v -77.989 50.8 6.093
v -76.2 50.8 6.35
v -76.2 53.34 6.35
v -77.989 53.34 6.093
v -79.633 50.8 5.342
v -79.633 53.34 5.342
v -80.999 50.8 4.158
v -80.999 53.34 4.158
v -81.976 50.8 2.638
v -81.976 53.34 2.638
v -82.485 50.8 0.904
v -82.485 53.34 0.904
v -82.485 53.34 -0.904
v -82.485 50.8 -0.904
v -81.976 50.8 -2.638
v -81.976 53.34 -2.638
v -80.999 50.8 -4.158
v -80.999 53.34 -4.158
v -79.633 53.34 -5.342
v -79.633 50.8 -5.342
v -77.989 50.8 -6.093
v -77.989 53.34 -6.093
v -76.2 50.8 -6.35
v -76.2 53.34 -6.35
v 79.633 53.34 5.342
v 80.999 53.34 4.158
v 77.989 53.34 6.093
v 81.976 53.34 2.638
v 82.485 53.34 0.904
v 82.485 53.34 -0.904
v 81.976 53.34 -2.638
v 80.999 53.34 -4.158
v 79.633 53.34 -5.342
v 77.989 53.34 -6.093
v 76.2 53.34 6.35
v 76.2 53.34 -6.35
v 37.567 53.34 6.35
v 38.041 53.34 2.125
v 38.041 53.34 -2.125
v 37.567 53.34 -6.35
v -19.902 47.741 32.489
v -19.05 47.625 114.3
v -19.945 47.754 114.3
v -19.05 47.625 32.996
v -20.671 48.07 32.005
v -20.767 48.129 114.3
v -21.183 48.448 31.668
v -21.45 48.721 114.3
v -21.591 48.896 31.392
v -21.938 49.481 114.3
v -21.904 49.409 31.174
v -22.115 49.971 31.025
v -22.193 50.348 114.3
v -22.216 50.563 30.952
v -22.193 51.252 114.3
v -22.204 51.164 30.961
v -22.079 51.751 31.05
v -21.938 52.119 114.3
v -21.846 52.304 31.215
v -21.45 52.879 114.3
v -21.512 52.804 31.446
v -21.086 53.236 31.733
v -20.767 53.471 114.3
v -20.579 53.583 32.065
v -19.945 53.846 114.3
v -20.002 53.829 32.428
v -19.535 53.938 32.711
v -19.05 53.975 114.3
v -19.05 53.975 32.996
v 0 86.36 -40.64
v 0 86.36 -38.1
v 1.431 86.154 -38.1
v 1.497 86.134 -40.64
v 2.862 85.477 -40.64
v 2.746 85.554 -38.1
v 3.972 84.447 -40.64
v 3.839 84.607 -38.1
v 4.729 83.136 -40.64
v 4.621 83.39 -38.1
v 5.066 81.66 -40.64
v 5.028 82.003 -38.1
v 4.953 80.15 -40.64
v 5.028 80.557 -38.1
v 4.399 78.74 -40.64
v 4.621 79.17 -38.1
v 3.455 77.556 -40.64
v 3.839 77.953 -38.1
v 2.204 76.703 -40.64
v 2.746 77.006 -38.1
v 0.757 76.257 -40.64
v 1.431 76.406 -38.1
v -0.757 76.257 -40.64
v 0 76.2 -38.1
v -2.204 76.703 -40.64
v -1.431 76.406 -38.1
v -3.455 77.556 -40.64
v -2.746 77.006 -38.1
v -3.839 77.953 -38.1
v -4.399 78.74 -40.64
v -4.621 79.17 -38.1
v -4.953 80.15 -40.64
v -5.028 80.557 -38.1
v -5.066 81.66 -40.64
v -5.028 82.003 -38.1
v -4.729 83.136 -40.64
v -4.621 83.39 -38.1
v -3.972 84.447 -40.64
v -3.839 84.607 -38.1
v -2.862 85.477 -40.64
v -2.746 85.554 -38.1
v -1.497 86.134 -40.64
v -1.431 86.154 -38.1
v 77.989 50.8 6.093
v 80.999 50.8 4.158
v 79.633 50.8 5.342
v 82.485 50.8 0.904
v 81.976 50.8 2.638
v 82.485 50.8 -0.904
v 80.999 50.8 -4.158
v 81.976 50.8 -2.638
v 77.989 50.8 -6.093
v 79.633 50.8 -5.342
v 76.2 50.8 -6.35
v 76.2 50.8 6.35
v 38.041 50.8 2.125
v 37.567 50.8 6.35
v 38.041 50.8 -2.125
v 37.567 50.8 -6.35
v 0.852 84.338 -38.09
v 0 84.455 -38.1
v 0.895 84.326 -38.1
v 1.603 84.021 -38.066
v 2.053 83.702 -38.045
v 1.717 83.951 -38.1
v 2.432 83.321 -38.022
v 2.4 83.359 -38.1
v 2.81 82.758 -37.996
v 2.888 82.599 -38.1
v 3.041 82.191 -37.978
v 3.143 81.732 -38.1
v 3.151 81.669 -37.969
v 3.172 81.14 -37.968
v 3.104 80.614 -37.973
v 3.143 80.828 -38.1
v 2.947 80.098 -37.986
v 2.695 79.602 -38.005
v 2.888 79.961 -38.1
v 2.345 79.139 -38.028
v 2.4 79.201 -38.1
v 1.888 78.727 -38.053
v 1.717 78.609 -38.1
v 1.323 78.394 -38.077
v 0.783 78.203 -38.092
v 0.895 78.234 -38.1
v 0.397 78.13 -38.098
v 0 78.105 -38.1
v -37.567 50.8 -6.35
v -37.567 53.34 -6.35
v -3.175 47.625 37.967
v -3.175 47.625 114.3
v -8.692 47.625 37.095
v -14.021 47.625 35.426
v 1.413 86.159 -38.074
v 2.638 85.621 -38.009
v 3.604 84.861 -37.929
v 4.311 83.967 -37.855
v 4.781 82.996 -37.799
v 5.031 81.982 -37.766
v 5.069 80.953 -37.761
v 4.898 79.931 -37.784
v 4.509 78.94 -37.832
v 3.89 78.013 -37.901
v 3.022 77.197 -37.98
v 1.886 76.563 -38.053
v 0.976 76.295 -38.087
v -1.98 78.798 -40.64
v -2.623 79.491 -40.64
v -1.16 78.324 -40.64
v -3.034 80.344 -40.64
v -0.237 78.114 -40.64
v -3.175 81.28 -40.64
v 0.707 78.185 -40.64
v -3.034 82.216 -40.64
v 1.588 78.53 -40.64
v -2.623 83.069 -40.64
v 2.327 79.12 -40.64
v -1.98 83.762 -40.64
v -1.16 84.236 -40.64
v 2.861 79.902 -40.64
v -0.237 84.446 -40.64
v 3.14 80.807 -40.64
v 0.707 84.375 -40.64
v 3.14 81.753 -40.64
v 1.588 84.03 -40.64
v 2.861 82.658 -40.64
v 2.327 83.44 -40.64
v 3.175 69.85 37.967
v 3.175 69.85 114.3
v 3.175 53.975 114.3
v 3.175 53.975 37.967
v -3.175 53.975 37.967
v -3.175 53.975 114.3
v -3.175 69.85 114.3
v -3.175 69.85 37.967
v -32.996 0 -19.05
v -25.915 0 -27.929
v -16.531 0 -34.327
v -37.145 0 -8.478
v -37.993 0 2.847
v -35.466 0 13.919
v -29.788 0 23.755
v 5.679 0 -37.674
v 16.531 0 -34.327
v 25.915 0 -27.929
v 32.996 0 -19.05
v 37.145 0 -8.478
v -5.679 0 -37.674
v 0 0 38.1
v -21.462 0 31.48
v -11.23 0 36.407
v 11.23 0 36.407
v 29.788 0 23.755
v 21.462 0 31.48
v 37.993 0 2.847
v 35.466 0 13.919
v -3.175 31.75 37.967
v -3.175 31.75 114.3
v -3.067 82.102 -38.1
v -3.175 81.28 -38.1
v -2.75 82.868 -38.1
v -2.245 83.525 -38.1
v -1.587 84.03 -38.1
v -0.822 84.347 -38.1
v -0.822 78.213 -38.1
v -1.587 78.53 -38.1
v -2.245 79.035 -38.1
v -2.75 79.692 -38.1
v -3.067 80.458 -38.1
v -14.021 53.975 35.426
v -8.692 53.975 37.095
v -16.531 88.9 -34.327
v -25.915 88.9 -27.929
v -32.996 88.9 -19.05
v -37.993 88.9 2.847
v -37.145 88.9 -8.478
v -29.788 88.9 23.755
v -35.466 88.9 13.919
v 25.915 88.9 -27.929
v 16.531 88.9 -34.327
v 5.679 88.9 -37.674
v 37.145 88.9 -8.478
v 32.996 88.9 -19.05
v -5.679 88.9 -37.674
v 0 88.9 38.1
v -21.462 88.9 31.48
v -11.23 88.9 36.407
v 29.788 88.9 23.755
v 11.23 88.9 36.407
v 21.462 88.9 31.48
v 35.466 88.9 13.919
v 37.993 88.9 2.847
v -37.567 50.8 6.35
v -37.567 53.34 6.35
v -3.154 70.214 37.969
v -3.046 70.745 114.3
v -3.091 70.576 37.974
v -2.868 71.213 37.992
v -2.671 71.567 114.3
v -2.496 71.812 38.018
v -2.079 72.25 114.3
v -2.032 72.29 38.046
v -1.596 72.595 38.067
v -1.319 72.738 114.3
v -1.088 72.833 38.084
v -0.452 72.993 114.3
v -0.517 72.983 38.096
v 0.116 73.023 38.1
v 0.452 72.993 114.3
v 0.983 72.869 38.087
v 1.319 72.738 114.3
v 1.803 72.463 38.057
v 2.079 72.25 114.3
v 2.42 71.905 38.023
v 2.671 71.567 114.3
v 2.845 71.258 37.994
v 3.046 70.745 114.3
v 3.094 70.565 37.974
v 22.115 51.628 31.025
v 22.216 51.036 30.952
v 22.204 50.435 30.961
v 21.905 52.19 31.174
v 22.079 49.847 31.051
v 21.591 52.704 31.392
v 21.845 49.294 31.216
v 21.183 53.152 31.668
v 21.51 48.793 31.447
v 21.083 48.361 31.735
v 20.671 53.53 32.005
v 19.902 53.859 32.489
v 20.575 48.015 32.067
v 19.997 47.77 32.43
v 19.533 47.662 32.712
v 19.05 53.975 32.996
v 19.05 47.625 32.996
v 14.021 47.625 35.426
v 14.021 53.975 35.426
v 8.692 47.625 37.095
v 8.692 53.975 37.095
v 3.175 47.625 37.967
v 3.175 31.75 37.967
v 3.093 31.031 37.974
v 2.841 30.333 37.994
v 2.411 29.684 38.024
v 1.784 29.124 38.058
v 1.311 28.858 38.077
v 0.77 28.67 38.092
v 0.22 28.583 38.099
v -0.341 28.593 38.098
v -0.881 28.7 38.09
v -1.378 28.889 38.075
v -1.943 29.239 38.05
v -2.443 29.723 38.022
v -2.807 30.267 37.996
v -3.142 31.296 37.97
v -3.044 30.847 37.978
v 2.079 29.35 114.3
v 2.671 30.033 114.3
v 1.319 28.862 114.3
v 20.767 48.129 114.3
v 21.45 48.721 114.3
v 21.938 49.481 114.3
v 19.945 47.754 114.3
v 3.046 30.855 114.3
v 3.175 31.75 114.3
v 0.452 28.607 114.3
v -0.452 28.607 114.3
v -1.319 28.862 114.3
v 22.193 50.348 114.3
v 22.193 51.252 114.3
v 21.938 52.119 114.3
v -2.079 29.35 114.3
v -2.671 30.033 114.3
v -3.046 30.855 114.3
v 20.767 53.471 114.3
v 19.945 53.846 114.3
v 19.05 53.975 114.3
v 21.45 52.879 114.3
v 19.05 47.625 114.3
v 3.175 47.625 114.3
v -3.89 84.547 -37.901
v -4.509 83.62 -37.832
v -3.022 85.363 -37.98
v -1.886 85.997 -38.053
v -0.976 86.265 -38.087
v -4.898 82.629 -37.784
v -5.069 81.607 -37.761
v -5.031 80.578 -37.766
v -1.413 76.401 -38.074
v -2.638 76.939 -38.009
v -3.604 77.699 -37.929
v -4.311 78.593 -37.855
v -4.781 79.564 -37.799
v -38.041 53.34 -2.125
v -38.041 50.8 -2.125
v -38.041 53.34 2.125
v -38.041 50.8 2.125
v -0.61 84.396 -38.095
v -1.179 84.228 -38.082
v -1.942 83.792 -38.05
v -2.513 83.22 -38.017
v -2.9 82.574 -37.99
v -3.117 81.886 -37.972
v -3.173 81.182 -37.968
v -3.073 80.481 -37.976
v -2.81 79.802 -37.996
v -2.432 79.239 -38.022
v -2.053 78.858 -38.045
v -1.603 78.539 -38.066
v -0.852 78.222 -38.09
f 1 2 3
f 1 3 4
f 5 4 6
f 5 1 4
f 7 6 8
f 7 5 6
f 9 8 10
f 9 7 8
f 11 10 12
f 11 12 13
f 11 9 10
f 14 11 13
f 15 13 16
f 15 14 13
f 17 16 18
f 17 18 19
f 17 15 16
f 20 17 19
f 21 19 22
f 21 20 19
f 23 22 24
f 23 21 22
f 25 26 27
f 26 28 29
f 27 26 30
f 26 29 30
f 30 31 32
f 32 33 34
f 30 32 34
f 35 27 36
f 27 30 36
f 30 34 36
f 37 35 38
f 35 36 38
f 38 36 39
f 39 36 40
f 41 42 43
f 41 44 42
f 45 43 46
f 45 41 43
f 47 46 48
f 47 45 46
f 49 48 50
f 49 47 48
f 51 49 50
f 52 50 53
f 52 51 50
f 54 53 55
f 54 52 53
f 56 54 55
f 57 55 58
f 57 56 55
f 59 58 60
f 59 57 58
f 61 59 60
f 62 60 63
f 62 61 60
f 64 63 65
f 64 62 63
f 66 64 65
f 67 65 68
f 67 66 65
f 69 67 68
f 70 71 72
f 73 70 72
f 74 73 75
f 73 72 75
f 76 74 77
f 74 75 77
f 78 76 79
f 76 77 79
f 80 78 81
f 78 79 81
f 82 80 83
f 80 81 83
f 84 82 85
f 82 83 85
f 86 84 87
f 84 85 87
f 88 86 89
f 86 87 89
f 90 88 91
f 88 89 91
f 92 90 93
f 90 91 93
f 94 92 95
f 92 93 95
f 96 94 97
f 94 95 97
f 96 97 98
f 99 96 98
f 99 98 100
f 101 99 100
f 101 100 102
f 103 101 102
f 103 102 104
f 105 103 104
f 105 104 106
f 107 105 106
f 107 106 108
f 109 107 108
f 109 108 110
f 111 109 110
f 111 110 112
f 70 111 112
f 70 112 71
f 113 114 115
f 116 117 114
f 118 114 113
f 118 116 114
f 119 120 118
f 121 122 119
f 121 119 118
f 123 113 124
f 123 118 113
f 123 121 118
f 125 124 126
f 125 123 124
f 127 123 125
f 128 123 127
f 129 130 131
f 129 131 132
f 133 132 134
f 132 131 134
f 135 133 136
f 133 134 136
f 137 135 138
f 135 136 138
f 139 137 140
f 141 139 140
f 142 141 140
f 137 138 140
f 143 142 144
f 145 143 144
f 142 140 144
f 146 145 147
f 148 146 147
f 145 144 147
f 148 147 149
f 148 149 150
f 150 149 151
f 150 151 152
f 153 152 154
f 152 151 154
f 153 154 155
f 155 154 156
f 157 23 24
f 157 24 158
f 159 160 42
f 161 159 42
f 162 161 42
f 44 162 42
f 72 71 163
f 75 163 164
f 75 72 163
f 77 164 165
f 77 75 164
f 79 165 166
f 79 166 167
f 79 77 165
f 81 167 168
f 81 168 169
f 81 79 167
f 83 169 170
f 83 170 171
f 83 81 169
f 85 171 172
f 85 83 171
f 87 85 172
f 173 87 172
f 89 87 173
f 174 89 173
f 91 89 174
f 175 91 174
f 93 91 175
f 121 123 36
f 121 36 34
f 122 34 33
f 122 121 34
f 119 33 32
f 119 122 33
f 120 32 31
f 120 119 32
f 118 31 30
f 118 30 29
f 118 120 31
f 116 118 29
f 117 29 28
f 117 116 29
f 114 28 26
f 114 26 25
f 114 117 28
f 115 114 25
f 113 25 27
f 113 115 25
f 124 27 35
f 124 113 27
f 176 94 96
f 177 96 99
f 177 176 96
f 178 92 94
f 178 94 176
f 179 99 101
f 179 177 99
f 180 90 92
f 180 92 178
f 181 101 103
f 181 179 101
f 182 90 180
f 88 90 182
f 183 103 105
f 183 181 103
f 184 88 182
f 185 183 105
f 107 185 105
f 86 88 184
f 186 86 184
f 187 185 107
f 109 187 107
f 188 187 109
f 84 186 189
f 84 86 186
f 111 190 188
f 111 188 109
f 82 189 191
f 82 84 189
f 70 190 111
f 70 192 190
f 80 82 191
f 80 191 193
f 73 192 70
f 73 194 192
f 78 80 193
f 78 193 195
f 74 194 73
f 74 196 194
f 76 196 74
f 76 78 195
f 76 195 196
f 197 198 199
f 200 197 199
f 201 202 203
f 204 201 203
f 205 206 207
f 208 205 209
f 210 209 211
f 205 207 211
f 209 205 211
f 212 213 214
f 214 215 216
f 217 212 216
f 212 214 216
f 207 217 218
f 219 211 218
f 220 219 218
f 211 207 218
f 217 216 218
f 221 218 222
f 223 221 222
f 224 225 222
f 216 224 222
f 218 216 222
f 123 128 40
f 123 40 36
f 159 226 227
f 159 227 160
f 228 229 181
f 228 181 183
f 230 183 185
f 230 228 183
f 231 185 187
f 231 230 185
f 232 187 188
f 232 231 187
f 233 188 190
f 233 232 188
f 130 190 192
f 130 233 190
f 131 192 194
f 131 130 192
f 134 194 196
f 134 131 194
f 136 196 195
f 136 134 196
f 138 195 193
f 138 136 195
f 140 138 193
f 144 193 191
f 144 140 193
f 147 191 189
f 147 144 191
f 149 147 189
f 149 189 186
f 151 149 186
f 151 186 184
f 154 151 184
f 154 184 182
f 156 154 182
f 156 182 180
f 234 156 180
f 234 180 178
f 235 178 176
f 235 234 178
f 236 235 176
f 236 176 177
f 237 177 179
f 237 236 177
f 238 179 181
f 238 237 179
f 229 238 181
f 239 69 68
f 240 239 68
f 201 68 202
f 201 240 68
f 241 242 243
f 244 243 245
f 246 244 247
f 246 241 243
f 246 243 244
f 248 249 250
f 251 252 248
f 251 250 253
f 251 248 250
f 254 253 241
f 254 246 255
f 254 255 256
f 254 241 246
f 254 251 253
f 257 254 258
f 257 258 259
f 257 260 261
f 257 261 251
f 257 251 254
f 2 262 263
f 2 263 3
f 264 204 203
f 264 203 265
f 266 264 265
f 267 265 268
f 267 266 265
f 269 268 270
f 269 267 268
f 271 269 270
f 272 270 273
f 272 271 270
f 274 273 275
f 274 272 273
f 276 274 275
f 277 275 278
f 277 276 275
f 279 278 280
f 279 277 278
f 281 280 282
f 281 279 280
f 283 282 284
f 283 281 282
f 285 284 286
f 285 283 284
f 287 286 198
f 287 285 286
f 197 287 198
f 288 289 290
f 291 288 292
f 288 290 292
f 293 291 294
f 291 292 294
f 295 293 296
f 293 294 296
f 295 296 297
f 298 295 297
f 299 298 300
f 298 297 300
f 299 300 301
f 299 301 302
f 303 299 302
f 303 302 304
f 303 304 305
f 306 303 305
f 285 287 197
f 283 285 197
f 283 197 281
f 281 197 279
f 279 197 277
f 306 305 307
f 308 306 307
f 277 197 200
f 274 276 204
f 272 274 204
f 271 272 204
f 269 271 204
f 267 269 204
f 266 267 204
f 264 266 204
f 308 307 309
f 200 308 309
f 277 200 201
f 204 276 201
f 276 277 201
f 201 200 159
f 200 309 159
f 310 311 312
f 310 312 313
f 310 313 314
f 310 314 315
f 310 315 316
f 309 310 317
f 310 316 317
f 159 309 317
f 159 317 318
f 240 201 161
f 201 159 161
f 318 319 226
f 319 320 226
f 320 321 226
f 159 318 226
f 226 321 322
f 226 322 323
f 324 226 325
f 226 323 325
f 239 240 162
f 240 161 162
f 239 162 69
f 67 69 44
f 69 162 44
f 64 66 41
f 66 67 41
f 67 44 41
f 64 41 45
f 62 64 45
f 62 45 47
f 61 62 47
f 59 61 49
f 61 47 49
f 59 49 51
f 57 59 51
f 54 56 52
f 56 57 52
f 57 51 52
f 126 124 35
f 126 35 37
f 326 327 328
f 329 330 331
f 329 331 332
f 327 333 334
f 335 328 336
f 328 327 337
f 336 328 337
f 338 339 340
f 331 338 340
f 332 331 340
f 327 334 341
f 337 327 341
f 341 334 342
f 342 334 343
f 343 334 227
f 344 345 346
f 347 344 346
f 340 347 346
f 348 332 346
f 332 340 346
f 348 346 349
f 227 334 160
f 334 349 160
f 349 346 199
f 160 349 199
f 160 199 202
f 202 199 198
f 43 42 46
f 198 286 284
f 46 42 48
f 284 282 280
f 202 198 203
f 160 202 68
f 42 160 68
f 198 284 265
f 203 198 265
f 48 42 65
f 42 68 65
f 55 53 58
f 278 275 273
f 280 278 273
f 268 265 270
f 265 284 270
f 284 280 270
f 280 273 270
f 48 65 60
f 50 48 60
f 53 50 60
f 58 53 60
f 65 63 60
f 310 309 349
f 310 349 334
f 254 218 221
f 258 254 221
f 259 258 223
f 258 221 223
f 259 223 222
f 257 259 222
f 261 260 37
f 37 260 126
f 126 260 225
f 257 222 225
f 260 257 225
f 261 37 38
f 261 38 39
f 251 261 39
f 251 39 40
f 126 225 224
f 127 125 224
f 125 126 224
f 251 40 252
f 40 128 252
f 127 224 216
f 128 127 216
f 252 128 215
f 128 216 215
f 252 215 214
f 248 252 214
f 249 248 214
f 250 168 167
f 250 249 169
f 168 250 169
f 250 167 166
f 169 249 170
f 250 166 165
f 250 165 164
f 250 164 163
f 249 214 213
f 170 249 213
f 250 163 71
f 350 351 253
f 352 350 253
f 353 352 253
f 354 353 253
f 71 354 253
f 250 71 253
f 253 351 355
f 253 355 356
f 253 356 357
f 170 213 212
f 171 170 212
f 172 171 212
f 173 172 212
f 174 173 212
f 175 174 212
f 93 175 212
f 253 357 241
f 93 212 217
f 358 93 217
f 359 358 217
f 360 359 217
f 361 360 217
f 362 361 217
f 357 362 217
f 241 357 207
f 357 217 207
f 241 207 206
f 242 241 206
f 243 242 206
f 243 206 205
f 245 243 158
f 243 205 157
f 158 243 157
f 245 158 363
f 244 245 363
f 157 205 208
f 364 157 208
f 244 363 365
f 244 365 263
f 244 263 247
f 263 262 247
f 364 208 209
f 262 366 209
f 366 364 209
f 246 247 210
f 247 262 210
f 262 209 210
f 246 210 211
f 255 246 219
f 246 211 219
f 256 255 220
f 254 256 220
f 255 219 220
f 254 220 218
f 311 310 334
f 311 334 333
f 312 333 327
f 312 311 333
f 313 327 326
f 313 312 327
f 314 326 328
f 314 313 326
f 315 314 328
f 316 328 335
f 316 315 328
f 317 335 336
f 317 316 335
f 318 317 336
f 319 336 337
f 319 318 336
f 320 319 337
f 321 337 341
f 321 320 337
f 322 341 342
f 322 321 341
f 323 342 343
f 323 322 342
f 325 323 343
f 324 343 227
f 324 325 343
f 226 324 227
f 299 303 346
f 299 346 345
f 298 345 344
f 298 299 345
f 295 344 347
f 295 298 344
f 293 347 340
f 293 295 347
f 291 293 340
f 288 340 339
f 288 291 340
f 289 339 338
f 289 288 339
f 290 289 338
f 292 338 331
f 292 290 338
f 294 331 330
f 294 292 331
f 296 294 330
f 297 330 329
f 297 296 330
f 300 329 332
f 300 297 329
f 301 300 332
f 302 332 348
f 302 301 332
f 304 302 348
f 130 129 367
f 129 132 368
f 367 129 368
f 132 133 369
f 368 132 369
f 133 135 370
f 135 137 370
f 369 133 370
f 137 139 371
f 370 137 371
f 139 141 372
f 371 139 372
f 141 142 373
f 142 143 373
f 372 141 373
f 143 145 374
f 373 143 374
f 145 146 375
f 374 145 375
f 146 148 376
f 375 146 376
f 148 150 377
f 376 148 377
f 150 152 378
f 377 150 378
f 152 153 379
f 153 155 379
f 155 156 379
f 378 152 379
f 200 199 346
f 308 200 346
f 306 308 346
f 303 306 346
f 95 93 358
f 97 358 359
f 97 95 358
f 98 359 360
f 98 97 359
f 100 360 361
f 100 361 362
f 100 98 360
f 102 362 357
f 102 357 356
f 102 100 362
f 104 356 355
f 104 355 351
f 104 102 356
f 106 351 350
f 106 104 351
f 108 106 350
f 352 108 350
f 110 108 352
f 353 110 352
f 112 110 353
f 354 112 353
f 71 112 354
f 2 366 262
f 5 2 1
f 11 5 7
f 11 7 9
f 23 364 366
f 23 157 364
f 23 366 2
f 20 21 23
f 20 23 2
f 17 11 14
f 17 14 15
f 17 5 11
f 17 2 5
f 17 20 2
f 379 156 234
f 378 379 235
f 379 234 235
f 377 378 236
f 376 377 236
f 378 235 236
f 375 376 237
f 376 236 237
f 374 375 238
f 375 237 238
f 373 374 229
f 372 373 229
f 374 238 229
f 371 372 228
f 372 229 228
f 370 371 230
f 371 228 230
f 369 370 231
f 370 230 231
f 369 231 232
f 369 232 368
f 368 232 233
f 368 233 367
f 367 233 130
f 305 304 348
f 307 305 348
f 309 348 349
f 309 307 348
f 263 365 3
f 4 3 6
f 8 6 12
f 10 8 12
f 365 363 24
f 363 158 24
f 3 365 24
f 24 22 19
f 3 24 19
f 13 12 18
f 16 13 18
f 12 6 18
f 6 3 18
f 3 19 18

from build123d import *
from build123d.topology import SkipClean

# Parameters (mm, degrees)
SKETCH1_R                       = 38.1
BOSS_EXTRUDE1_DEPTH             = 88.9
BOSS_EXTRUDE2_DEPTH             = 2.54
BOSS_EXTRUDE4_REACH             = 145.263
BOSS_EXTRUDE4_END_RADIUS        = 38.1
BOSS_EXTRUDE4_DIRECTION_2_DEPTH = 76.2
BOSS_EXTRUDE7_REACH             = 196.791
BOSS_EXTRUDE7_END_RADIUS        = 38.1
SKETCH7_R                       = 5.08
SKETCH7_R_2                     = 3.175
BOSS_EXTRUDE7_DIRECTION_2_DEPTH = 2.54


with BuildPart() as part:
    # Sketch1 → Boss-Extrude1 (new body)
    with BuildSketch(Plane(origin=(0, 0, 0), x_dir=(1, 0, 0), z_dir=(0, 1, 0))):
        Circle(SKETCH1_R)
    extrude(amount=BOSS_EXTRUDE1_DEPTH)

    # Sketch3 → Boss-Extrude2 (add)
    with BuildSketch(Plane(origin=(0, 50.8, 0), x_dir=(1, 0, 0), z_dir=(0, 1, 0))):
        with BuildLine():
            Line((-76.2, 6.35), (76.2, 6.35))
            ThreePointArc((76.2, 6.35), (82.55, 0), (76.2, -6.35))
            Line((76.2, -6.35), (-76.2, -6.35))
            ThreePointArc((-76.2, -6.35), (-82.55, 0), (-76.2, 6.35))
        make_face()
    extrude(amount=BOSS_EXTRUDE2_DEPTH)

    # Boss-Extrude7: up to this cylinder (the profile starts outside it)
    boss_extrude7_end = Plane(origin=(0, 81.28, 0), z_dir=(0, -1, 0)) * Cylinder(BOSS_EXTRUDE7_END_RADIUS, 470.782, mode=Mode.PRIVATE)
    # Sketch7 → Boss-Extrude7 (add, up to the surface)
    with BuildSketch(Plane(origin=(0, 88.9, -38.1), x_dir=(-1, 0, 0), z_dir=(0, 0, -1)), mode=Mode.PRIVATE) as boss_extrude7_sk1:
        with Locations((0, -7.62)):
            Circle(SKETCH7_R)
        with Locations((0, -7.62)):
            Circle(SKETCH7_R_2, mode=Mode.SUBTRACT)
    boss_extrude7_tool1 = extrude(boss_extrude7_sk1.sketch, amount=-BOSS_EXTRUDE7_REACH, mode=Mode.PRIVATE) - boss_extrude7_end
    add(boss_extrude7_tool1.solids().sort_by_distance((4.936316, 81.28, -38.1))[0])
    add(boss_extrude7_tool1.solids().sort_by_distance((4.936316, 81.28, -38.1))[1])

    # Sketch7 → Boss-Extrude7 direction 2 (add)
    with SkipClean():  # the faces are left unmerged after this step: merging them gives an invalid solid
        with BuildSketch(Plane(origin=(0, 88.9, -38.1), x_dir=(-1, 0, 0), z_dir=(0, 0, -1))):
            with Locations((0, -7.62)):
                Circle(SKETCH7_R)
            with Locations((0, -7.62)):
                Circle(SKETCH7_R_2, mode=Mode.SUBTRACT)
        extrude(amount=BOSS_EXTRUDE7_DIRECTION_2_DEPTH)


with BuildPart() as body_2:
    # Boss-Extrude4: up to this cylinder (the profile starts outside it)
    boss_extrude4_end = Plane(origin=(0, 50.8, 0), z_dir=(0, -1, 0)) * Cylinder(BOSS_EXTRUDE4_END_RADIUS, 367.726, mode=Mode.PRIVATE)
    # Sketch5 → Boss-Extrude4 (new, up to the surface)
    with BuildSketch(Plane.XY.offset(38.1), mode=Mode.PRIVATE) as boss_extrude4_sk1:
        with BuildLine():
            Line((-19.05, 53.975), (-3.175, 53.975))
            Line((-3.175, 53.975), (-3.175, 69.85))
            ThreePointArc((-3.175, 69.85), (0, 73.025), (3.175, 69.85))
            Line((3.175, 69.85), (3.175, 53.975))
            Line((3.175, 53.975), (19.05, 53.975))
            ThreePointArc((19.05, 53.975), (22.225, 50.8), (19.05, 47.625))
            Line((19.05, 47.625), (3.175, 47.625))
            Line((3.175, 47.625), (3.175, 31.75))
            ThreePointArc((3.175, 31.75), (0, 28.575), (-3.175, 31.75))
            Line((-3.175, 31.75), (-3.175, 47.625))
            Line((-3.175, 47.625), (-19.05, 47.625))
            ThreePointArc((-19.05, 47.625), (-22.225, 50.8), (-19.05, 53.975))
        make_face()
    boss_extrude4_tool1 = extrude(boss_extrude4_sk1.sketch, amount=-BOSS_EXTRUDE4_REACH, mode=Mode.PRIVATE) - boss_extrude4_end
    add(boss_extrude4_tool1.solids().sort_by_distance((0, 50.8, 38.1))[0])
    add(boss_extrude4_tool1.solids().sort_by_distance((0, 50.8, 38.1))[1])

    # Sketch5 → Boss-Extrude4 direction 2 (add)
    with BuildSketch(Plane.XY.offset(38.1)):
        with BuildLine():
            Line((-19.05, 53.975), (-3.175, 53.975))
            Line((-3.175, 53.975), (-3.175, 69.85))
            ThreePointArc((-3.175, 69.85), (0, 73.025), (3.175, 69.85))
            Line((3.175, 69.85), (3.175, 53.975))
            Line((3.175, 53.975), (19.05, 53.975))
            ThreePointArc((19.05, 53.975), (22.225, 50.8), (19.05, 47.625))
            Line((19.05, 47.625), (3.175, 47.625))
            Line((3.175, 47.625), (3.175, 31.75))
            ThreePointArc((3.175, 31.75), (0, 28.575), (-3.175, 31.75))
            Line((-3.175, 31.75), (-3.175, 47.625))
            Line((-3.175, 47.625), (-19.05, 47.625))
            ThreePointArc((-19.05, 47.625), (-22.225, 50.8), (-19.05, 53.975))
        make_face()
    extrude(amount=BOSS_EXTRUDE4_DIRECTION_2_DEPTH)


solid = Compound([part.part, body_2.part])
